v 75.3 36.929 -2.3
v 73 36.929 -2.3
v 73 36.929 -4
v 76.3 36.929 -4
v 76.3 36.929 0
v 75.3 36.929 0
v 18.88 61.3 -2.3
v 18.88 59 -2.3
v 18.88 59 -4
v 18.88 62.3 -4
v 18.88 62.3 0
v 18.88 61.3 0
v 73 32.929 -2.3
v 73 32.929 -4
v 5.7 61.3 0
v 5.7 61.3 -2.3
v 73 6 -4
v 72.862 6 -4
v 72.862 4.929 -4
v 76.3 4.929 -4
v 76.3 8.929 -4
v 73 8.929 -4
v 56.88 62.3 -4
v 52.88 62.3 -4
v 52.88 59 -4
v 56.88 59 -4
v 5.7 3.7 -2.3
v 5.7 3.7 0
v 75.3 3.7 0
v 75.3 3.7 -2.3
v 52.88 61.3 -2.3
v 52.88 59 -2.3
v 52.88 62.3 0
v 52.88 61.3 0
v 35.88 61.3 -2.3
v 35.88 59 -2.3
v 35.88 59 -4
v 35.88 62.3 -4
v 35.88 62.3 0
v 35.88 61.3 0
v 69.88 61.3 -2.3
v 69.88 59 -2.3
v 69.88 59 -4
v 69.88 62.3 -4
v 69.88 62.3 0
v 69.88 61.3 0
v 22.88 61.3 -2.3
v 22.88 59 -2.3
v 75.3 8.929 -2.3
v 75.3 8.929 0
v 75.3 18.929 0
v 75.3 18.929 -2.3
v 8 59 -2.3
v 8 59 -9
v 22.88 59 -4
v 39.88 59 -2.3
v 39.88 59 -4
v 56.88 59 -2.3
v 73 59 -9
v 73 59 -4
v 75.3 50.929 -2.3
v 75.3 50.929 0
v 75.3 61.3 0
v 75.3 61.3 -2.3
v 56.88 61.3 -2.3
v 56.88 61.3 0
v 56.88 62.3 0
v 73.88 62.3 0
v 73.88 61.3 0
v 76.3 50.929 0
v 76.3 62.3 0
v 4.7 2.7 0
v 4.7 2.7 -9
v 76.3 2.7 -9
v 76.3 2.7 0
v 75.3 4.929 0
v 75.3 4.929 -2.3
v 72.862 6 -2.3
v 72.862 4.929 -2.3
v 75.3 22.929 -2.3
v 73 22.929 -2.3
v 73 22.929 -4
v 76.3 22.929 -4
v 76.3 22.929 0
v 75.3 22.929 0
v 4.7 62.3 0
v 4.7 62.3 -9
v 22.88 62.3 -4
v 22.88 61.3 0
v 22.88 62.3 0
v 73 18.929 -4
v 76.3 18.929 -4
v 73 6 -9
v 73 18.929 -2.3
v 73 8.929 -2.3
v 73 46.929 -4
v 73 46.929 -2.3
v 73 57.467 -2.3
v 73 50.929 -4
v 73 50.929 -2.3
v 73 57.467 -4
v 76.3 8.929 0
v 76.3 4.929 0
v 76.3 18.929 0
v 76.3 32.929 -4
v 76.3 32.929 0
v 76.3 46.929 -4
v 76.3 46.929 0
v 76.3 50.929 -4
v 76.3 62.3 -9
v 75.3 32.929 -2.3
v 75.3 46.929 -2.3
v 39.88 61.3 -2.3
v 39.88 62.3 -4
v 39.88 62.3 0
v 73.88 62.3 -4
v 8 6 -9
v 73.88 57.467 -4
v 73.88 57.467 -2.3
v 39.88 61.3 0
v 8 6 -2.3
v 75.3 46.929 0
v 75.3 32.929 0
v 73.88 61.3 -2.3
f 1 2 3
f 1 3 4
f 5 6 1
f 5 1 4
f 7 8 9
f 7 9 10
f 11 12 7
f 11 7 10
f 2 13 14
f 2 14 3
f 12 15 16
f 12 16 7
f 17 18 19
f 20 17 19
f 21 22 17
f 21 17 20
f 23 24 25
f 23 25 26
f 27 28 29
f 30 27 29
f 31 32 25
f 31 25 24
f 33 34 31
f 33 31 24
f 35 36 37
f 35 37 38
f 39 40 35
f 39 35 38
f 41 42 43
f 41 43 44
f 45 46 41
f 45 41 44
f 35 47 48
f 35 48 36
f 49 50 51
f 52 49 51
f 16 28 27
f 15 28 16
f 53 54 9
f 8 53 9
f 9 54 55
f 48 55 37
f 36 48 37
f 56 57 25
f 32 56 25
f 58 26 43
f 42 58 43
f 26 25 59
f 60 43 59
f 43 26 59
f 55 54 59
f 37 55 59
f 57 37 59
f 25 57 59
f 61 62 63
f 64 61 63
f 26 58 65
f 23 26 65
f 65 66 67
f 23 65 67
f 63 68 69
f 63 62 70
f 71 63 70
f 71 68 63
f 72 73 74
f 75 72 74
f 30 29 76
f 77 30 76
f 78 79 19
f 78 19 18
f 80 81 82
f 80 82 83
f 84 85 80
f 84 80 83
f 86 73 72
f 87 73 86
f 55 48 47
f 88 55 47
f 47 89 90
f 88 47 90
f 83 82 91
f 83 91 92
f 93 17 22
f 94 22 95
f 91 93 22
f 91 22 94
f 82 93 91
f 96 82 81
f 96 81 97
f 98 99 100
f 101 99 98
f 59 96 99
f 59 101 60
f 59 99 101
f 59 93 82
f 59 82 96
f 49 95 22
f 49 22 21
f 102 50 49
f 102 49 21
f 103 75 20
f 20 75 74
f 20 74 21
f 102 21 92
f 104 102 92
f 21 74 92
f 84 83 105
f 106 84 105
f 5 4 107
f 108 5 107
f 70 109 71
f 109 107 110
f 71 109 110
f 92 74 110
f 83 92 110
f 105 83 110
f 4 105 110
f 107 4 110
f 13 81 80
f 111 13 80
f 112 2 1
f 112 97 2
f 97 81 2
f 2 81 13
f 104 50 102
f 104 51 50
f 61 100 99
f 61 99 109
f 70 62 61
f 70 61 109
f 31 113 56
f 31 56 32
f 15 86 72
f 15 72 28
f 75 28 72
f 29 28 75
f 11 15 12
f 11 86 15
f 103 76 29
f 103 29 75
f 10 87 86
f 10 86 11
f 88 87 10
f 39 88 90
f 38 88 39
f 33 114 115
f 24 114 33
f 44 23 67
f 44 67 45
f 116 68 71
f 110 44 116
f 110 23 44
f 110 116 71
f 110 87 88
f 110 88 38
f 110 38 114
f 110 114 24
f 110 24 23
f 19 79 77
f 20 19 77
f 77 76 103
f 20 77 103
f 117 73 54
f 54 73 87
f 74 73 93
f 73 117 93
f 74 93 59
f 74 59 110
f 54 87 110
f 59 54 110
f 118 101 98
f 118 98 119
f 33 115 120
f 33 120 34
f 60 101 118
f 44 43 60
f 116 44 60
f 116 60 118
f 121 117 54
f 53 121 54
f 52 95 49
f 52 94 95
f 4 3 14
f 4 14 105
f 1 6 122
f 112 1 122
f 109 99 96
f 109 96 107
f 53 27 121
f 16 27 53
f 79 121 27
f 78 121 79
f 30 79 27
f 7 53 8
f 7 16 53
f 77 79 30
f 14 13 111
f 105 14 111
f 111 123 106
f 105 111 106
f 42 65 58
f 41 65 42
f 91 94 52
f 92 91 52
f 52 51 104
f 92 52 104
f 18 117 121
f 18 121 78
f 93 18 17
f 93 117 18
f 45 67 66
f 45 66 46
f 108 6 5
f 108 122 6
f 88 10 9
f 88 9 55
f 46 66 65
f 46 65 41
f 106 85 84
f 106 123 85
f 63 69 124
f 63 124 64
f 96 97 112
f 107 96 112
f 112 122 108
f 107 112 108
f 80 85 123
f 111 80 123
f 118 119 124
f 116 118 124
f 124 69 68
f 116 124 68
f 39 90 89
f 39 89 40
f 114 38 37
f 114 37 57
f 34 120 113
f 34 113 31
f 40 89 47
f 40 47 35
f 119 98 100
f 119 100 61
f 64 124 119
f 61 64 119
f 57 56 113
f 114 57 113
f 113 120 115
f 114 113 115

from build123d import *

# Parameters (mm, degrees)
SKETCH017_W     = 71.6
SKETCH017_H     = 59.6
SKETCH017_W_2   = 65
SKETCH017_H_2   = 53
PAD009_DEPTH    = 9
SKETCH015_W     = 69.6
SKETCH015_H     = 57.6
POCKET004_DEPTH = 2.3
SKETCH016_W     = 4
SKETCH016_H     = 5.483822
SKETCH016_H_2   = 6.120376
SKETCH016_H_3   = 8.800861
SKETCH016_H_4   = 6.480469
SKETCH016_W_2   = 4.596547
SKETCH016_H_5   = 4
SKETCH016_W_3   = 6.834637
SKETCH016_W_4   = 8.377245
SKETCH016_W_5   = 7.094059
POCKET006_DEPTH = 4


with BuildPart() as part:
    # Sketch017 → Pad009 (new body)
    with BuildSketch(Plane.XY):
        with Locations((32.5, 26.5)):
            Rectangle(SKETCH017_W, SKETCH017_H)
        with Locations((32.5, 26.5)):
            Rectangle(SKETCH017_W_2, SKETCH017_H_2, mode=Mode.SUBTRACT)
    extrude(amount=PAD009_DEPTH)

    # Sketch015 (on Face10 of Pad009) → Pocket004 (cut)
    with BuildSketch(Plane.XY.offset(9)):
        with Locations((32.5, 26.5)):
            Rectangle(SKETCH015_W, SKETCH015_H)
    extrude(amount=-POCKET004_DEPTH, mode=Mode.SUBTRACT)

    # Sketch016 (on Face5 of Pocket004) → Pocket006 (cut)
    with BuildSketch(Plane.XY.offset(9)):
        with Locations((12.880272, 55.392385)):
            Rectangle(SKETCH016_W, SKETCH016_H)
        with Locations((29.880272, 54.935013)):
            Rectangle(SKETCH016_W, SKETCH016_H_2)
        with Locations((46.880272, 55.440656)):
            Rectangle(SKETCH016_W, SKETCH016_H_3)
        with Locations((63.880272, 54.707588)):
            Rectangle(SKETCH016_W, SKETCH016_H_4)
        with Locations((66.550759, 42.929046)):
            Rectangle(SKETCH016_W_2, SKETCH016_H_5)
        with Locations((68.417426, 28.929046)):
            Rectangle(SKETCH016_W_3, SKETCH016_H_5)
        with Locations((68.143181, 14.929046)):
            Rectangle(SKETCH016_W_4, SKETCH016_H_5)
        with Locations((68.408536, 0.929046)):
            Rectangle(SKETCH016_W_5, SKETCH016_H_5)
    extrude(amount=-POCKET006_DEPTH, mode=Mode.SUBTRACT)


with BuildPart() as part_1:
    # Body003 placement: moved
    add(part.part.moved(Location((8, 6, -9))))


solid = part_1.part
